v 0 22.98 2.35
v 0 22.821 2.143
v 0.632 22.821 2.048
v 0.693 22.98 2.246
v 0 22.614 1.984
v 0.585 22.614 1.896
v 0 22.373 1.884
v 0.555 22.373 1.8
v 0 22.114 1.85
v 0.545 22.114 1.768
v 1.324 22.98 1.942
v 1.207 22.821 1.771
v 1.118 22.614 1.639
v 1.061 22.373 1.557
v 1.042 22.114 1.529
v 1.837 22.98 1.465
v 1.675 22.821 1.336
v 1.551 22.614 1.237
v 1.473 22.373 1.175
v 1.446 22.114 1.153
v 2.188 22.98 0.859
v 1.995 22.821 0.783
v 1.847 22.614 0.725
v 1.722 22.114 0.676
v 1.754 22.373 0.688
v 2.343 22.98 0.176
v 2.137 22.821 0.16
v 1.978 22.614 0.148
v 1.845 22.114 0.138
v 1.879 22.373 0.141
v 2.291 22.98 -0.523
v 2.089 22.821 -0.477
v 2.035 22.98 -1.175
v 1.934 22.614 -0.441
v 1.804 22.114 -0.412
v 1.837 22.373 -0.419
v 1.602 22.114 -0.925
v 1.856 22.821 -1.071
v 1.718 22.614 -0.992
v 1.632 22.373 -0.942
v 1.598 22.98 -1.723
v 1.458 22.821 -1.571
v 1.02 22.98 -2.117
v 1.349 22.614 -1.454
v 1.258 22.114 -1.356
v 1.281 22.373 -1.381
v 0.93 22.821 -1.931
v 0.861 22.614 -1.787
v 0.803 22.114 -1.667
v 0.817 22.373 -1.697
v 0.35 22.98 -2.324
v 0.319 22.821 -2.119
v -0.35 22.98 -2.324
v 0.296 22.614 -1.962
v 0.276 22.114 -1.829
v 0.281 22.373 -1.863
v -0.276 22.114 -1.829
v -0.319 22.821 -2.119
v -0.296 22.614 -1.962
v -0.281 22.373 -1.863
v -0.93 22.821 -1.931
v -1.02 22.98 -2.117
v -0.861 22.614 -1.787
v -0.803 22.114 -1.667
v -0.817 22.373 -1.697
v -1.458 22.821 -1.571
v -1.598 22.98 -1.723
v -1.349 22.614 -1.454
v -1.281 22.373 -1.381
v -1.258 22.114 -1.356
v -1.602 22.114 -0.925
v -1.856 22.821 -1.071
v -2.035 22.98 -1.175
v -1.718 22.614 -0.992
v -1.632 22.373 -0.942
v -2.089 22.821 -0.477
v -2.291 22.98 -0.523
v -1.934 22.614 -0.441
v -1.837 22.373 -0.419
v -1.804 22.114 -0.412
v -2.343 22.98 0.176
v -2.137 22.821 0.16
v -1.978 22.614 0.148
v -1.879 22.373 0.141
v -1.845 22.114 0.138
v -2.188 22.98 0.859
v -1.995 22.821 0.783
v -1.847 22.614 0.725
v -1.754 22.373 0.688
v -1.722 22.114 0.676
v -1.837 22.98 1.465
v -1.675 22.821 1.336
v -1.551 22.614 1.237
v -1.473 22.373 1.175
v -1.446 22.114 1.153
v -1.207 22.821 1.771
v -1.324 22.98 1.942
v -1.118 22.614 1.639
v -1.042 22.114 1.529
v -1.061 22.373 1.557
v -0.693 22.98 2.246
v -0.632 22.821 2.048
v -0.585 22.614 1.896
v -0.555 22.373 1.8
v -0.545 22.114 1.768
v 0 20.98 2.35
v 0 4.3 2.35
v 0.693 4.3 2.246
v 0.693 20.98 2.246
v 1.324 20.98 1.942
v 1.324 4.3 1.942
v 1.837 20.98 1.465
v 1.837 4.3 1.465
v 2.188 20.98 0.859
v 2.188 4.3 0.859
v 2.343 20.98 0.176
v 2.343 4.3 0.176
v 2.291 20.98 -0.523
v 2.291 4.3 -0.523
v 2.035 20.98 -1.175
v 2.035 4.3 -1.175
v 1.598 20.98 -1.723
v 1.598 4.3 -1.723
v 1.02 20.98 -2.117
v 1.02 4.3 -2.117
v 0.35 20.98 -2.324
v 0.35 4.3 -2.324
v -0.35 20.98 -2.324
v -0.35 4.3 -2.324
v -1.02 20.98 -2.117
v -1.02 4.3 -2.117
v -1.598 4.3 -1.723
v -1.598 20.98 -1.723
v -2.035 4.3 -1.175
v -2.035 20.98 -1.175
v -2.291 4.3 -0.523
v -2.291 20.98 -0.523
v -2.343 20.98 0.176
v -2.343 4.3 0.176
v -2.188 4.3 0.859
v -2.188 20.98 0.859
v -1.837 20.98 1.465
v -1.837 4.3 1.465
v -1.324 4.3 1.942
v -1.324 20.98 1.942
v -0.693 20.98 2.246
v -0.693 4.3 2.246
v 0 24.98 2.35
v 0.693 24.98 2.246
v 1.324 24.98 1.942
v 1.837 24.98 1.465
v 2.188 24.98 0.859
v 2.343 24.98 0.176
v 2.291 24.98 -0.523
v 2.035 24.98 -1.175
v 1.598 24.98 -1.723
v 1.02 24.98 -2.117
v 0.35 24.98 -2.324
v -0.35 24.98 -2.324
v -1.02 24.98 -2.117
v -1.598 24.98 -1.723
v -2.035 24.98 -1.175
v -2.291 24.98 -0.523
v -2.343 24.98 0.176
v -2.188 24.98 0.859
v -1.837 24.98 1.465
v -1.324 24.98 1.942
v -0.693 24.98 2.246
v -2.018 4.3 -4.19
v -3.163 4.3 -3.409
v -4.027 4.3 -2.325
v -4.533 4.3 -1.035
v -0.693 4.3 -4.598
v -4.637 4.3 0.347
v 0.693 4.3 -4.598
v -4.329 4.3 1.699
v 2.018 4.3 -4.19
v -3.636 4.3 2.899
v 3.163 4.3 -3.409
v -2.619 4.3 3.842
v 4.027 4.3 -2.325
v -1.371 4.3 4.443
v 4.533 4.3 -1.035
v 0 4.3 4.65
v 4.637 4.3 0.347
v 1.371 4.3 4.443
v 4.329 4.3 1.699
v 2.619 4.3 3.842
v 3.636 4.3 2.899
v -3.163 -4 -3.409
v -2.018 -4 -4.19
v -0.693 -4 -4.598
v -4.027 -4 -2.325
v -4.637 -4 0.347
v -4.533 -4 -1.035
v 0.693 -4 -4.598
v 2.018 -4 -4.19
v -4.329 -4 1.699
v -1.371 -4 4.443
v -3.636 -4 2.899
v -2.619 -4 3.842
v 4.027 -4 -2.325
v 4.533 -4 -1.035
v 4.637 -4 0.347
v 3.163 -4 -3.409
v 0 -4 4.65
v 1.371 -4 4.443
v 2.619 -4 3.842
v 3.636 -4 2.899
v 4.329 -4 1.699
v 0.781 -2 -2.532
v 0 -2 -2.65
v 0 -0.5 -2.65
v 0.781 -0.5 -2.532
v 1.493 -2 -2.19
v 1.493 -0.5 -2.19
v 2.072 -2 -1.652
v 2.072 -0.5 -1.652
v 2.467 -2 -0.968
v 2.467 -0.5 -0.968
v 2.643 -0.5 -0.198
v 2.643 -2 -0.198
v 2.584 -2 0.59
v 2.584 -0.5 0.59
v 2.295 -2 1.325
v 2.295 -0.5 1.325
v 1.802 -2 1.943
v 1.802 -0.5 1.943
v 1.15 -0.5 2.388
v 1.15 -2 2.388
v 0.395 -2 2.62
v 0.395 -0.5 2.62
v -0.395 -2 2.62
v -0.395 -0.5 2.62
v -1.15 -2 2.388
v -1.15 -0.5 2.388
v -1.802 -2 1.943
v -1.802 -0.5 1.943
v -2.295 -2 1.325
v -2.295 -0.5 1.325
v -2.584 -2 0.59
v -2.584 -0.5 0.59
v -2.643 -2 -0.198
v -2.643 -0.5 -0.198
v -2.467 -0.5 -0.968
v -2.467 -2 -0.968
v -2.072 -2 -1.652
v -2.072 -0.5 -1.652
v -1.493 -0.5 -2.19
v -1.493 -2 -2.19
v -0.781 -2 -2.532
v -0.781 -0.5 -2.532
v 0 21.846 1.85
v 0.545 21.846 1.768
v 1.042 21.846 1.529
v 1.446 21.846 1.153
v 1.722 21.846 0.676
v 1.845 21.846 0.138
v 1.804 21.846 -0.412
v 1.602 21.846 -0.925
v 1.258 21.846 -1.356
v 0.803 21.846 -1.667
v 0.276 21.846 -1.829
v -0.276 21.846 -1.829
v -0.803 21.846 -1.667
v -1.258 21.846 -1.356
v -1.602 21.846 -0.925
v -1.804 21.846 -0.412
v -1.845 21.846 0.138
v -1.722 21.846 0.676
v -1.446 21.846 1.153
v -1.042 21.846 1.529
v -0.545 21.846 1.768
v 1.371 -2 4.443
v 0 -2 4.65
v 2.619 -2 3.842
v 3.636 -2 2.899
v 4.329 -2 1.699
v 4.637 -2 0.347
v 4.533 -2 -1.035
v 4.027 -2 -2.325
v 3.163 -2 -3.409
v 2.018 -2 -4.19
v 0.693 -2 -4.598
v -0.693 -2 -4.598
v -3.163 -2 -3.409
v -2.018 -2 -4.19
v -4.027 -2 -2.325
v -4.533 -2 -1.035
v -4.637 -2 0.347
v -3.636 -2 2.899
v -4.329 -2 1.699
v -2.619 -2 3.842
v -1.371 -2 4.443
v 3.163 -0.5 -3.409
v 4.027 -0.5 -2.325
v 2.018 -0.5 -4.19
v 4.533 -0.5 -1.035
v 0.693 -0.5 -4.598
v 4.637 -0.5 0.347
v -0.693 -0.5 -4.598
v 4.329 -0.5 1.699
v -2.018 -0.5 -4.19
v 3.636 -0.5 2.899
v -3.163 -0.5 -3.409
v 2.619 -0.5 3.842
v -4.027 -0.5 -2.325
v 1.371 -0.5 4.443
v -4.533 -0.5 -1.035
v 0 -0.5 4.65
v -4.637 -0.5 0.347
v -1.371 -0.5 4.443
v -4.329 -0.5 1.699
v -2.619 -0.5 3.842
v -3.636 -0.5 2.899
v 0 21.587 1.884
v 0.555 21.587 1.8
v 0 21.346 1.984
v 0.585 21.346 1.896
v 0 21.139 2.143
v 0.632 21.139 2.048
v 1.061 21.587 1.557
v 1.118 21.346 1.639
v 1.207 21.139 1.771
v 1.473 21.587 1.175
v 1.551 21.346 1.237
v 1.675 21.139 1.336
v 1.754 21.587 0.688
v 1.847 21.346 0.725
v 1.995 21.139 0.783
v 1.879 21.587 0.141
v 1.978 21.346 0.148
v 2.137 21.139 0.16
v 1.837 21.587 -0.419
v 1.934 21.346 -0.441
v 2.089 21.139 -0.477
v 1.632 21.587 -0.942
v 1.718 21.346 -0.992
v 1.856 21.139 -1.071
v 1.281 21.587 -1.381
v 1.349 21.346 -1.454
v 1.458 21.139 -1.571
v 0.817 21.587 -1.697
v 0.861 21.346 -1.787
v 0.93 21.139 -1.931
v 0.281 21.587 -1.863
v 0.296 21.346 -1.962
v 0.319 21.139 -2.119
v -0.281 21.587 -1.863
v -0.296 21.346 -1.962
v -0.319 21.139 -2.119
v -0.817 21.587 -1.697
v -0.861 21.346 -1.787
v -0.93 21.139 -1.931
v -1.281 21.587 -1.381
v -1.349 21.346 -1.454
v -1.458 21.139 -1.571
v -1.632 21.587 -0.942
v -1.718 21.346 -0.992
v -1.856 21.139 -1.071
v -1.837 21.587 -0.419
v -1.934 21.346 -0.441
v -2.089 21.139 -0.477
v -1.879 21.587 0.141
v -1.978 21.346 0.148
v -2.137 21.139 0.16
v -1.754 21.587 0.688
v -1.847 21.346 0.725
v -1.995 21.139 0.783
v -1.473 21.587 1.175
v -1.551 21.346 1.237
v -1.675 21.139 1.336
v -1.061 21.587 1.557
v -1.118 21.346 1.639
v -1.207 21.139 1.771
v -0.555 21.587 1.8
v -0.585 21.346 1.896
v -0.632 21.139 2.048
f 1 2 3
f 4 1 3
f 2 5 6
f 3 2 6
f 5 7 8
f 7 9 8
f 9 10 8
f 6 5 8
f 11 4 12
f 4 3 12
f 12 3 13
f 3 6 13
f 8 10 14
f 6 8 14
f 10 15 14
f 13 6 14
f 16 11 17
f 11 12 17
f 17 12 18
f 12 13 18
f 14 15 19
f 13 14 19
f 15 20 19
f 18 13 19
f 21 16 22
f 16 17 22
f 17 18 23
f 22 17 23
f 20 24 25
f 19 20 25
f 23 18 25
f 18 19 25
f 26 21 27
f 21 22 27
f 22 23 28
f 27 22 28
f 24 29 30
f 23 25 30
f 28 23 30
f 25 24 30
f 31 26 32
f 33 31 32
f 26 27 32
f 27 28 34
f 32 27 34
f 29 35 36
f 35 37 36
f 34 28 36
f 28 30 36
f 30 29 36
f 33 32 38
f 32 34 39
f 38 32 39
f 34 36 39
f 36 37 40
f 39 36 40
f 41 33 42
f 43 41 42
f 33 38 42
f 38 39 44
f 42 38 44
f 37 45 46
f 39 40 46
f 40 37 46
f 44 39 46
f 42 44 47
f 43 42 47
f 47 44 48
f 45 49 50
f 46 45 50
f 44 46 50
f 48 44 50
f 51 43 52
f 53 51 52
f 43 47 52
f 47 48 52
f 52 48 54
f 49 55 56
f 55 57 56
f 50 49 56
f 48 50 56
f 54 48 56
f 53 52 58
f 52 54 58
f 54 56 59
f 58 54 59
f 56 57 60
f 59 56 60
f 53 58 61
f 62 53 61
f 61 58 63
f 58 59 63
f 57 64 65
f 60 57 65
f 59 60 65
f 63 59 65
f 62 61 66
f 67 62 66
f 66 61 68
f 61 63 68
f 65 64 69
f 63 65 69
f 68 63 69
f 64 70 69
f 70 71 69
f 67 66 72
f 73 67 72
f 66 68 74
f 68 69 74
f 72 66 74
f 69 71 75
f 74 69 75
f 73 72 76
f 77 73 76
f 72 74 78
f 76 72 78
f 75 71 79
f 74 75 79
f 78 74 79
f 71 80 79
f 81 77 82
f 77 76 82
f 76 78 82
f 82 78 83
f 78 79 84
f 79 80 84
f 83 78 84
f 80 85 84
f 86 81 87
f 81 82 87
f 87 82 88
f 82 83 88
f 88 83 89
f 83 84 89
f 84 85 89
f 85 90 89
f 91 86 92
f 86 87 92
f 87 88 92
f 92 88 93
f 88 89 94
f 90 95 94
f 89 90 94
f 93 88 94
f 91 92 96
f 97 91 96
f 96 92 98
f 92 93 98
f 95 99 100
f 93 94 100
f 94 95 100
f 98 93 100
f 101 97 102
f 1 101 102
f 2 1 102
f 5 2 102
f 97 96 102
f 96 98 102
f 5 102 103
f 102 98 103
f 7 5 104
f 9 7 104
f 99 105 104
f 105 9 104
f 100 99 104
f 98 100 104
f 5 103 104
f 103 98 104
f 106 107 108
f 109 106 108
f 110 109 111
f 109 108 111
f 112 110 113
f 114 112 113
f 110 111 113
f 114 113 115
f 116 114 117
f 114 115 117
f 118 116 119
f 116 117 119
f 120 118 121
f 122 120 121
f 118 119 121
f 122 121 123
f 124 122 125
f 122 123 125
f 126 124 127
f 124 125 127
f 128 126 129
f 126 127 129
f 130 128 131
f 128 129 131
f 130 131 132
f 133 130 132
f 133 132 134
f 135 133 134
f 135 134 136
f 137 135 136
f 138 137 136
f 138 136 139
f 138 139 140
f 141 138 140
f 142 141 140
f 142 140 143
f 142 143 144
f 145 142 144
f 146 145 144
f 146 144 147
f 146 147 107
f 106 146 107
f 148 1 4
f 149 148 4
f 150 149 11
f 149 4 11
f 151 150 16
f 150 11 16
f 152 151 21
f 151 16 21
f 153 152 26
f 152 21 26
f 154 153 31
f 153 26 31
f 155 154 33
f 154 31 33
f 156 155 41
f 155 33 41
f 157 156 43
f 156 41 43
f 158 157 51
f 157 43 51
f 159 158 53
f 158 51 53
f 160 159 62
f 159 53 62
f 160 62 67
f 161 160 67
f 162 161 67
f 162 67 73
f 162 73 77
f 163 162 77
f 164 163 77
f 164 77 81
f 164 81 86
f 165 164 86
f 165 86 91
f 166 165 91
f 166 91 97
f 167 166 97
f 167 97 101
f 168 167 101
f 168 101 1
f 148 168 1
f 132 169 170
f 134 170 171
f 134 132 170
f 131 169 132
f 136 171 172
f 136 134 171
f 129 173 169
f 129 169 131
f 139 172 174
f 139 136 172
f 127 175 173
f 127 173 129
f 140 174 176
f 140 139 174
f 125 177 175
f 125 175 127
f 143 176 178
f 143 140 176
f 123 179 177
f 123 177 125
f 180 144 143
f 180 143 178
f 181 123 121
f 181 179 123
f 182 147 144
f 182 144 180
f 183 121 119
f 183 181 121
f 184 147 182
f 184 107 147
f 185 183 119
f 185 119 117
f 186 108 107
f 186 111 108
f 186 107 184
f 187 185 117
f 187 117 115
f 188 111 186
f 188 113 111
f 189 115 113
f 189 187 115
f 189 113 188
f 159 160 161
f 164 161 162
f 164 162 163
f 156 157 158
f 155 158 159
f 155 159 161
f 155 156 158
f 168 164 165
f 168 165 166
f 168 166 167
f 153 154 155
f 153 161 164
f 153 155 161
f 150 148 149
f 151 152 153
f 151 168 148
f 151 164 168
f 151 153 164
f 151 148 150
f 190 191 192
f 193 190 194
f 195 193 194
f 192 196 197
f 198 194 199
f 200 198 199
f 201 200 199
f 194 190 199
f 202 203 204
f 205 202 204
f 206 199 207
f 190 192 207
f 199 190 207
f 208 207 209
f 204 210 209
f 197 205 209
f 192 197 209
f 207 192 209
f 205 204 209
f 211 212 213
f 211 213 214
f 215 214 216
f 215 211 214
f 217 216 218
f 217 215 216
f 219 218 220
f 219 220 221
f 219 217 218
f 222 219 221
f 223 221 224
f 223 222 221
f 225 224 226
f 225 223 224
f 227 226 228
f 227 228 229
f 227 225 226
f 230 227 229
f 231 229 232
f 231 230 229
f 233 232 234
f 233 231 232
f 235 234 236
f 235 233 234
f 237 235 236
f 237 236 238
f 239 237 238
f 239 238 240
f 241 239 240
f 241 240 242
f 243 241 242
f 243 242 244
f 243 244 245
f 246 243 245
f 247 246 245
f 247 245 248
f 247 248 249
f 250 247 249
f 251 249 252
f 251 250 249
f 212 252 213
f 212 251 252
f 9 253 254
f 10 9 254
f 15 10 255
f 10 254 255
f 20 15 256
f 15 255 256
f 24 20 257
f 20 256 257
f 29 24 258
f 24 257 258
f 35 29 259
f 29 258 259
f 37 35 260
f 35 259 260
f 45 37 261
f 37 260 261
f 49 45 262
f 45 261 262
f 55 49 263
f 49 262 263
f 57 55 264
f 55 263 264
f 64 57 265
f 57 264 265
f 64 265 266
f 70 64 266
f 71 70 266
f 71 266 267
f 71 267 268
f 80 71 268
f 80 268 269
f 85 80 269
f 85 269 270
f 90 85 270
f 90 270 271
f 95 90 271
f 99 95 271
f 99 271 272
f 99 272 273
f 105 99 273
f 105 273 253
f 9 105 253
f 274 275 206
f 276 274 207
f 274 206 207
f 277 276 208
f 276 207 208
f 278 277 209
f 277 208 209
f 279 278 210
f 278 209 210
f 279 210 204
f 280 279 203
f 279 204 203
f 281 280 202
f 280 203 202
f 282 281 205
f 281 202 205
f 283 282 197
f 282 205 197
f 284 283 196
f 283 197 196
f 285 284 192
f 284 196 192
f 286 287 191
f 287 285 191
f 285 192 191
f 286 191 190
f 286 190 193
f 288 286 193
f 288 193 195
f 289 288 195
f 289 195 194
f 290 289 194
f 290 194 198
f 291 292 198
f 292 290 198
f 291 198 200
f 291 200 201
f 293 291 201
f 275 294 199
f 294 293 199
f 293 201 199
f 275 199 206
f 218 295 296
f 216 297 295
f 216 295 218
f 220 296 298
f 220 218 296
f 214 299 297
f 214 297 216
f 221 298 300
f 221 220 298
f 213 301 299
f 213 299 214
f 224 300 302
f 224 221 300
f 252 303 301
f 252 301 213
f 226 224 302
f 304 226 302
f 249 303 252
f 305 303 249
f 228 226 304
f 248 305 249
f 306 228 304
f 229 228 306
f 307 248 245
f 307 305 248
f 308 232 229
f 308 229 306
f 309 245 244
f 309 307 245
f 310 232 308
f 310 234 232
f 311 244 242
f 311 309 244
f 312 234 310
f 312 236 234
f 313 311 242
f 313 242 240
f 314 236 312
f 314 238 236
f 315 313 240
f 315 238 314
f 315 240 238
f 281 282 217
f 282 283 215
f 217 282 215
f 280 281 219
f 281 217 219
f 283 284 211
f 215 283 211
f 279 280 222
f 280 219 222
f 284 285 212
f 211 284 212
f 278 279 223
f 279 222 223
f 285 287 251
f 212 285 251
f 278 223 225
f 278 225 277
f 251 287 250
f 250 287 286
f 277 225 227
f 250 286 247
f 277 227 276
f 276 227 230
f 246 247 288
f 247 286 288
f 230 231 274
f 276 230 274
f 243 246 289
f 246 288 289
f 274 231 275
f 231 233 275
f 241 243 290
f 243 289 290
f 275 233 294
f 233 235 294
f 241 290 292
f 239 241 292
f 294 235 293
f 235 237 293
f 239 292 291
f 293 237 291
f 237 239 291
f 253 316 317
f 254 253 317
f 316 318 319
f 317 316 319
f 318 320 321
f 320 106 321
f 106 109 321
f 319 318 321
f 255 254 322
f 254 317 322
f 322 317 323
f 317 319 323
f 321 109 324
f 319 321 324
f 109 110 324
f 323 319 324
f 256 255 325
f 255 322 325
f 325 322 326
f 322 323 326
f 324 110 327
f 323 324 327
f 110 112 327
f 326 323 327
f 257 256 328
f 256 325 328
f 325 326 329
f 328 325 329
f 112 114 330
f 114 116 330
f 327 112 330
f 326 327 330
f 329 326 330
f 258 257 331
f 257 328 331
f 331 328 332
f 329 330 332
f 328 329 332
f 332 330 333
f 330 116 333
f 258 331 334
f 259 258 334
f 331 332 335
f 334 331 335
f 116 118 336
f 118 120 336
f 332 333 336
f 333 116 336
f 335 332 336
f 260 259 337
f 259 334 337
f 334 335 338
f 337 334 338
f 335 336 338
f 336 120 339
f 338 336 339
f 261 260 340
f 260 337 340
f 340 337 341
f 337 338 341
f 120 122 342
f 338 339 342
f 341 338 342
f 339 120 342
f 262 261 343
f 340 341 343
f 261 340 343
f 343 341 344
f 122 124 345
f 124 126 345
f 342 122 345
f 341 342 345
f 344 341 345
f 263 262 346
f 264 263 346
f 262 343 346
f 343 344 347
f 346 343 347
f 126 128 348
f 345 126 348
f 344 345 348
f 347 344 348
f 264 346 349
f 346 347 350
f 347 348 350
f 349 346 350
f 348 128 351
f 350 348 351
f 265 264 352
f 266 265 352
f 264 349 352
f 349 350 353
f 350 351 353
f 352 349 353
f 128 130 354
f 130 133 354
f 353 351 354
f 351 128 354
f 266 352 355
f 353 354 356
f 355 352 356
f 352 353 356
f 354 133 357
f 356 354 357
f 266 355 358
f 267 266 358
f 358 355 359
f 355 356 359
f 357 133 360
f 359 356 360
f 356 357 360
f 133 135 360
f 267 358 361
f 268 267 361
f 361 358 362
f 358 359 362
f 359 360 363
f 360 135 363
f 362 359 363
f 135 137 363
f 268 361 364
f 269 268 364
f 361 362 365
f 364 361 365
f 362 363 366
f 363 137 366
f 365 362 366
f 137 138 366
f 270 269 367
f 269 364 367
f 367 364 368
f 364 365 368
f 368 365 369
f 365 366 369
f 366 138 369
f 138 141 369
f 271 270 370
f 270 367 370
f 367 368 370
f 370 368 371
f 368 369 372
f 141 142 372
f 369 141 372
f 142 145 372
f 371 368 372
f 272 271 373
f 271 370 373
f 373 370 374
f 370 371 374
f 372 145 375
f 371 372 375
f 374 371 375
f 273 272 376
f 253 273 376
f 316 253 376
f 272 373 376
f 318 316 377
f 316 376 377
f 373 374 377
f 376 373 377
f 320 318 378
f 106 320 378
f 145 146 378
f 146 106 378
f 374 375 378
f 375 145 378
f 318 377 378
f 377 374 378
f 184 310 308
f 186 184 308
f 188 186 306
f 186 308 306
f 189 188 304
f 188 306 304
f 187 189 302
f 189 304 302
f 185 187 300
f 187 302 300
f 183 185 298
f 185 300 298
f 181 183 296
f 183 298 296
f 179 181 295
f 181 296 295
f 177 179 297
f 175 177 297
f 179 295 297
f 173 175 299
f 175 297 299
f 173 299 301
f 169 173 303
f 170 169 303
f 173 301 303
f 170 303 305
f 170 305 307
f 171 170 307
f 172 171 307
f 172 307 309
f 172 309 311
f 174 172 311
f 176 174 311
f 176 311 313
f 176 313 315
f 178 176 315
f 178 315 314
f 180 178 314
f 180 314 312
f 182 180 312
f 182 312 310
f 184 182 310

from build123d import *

# Parameters (mm, degrees)
BOSS_EXTRUDE1_DEPTH      = 4.3
BOSS_EXTRUDE1_DEPTH_BACK = 4
SKETCH1_R                = 4.65
SKETCH2_R                = 2.35
BOSS_EXTRUDE2_DEPTH      = 20.68
CUT_EXTRUDE1_START       = -4
SKETCH3_R                = 2.35
SKETCH3_R_2              = 1.85
CUT_EXTRUDE1_DEPTH       = 2
CUT_EXTRUDE2_START       = -2
SKETCH4_R                = 4.65
SKETCH4_R_2              = 2.65
CUT_EXTRUDE2_DEPTH       = 1.5
FILLET1_R                = 1


with BuildPart() as part:
    # Sketch1 → Boss-Extrude1 (new, two sides: drawn at the far end of the back side and taken through both)
    with BuildSketch(Plane(origin=(0, 0, 0), x_dir=(1, 0, 0), z_dir=(0, 1, 0)).offset(-BOSS_EXTRUDE1_DEPTH_BACK)):
        with Locations(Location((0, 0, 0), (0, 0, 270))):
            Circle(SKETCH1_R)
    extrude(amount=BOSS_EXTRUDE1_DEPTH + BOSS_EXTRUDE1_DEPTH_BACK)

    # Sketch2 → Boss-Extrude2 (add)
    with BuildSketch(Plane(origin=(0, 4.3, 0), x_dir=(1, 0, 0), z_dir=(0, 1, 0))):
        with Locations(Location((0, 0, 0), (0, 0, 270))):
            Circle(SKETCH2_R)
    extrude(amount=BOSS_EXTRUDE2_DEPTH)

    # Sketch3 → Cut-Extrude1 (cut)
    with BuildSketch(Plane(origin=(0, 24.98, 0), x_dir=(1, 0, 0), z_dir=(0, 1, 0)).offset(CUT_EXTRUDE1_START)):
        with Locations(Location((0, 0, 0), (0, 0, 270))):
            Circle(SKETCH3_R)
        with Locations(Location((0, 0, 0), (0, 0, 270))):
            Circle(SKETCH3_R_2, mode=Mode.SUBTRACT)
    extrude(amount=CUT_EXTRUDE1_DEPTH, mode=Mode.SUBTRACT)

    # Sketch4 → Cut-Extrude2 (cut)
    with BuildSketch(Plane.XZ.offset(4).offset(CUT_EXTRUDE2_START)):
        with Locations(Location((0, 0, 0), (0, 0, 90))):
            Circle(SKETCH4_R)
        with Locations(Location((0, 0, 0), (0, 0, 270))):
            Circle(SKETCH4_R_2, mode=Mode.SUBTRACT)
    extrude(amount=-CUT_EXTRUDE2_DEPTH, mode=Mode.SUBTRACT)

    # Fillet1
    # the kernel refuses this fillet: 1 mm, written as the material it adds along each edge
    with BuildSketch(Plane(origin=(0, 20.98, 0), x_dir=(0, 0, 1), z_dir=(-1, 0, 0))) as fillet1_piece_1:
        with BuildLine():
            CenterArc((2.85, 0.866025404), FILLET1_R, 180, 60)
            Line((1.85, 0.866025404), (1.83, 0.866025404))
            Line((1.83, 0.866025404), (1.83, 0))
            Line((1.83, 0), (1.85, -0.02))
            ThreePointArc((1.85, -0.02), (2.1, -0.02), (2.34, -0.017320508))
            Line((2.34, -0.017320508), (2.35, 0))
        make_face()
    revolve(axis=Axis((0, 20.98, 0), (0, 1, 0)))
    with BuildSketch(Plane(origin=(0, 22.98, 0), x_dir=(0, 0, 1), z_dir=(-1, 0, 0))) as fillet1_piece_2:
        with BuildLine():
            CenterArc((2.85, -0.866025404), FILLET1_R, 120, 60)
            Line((2.35, 0), (2.34, 0.017320508))
            ThreePointArc((2.34, 0.017320508), (2.1, 0.02), (1.85, 0.02))
            Line((1.85, 0.02), (1.83, 0))
            Line((1.83, 0), (1.83, -0.866025404))
            Line((1.83, -0.866025404), (1.85, -0.866025404))
        make_face()
    revolve(axis=Axis((0, 22.98, 0), (0, 1, 0)))


solid = part.part
